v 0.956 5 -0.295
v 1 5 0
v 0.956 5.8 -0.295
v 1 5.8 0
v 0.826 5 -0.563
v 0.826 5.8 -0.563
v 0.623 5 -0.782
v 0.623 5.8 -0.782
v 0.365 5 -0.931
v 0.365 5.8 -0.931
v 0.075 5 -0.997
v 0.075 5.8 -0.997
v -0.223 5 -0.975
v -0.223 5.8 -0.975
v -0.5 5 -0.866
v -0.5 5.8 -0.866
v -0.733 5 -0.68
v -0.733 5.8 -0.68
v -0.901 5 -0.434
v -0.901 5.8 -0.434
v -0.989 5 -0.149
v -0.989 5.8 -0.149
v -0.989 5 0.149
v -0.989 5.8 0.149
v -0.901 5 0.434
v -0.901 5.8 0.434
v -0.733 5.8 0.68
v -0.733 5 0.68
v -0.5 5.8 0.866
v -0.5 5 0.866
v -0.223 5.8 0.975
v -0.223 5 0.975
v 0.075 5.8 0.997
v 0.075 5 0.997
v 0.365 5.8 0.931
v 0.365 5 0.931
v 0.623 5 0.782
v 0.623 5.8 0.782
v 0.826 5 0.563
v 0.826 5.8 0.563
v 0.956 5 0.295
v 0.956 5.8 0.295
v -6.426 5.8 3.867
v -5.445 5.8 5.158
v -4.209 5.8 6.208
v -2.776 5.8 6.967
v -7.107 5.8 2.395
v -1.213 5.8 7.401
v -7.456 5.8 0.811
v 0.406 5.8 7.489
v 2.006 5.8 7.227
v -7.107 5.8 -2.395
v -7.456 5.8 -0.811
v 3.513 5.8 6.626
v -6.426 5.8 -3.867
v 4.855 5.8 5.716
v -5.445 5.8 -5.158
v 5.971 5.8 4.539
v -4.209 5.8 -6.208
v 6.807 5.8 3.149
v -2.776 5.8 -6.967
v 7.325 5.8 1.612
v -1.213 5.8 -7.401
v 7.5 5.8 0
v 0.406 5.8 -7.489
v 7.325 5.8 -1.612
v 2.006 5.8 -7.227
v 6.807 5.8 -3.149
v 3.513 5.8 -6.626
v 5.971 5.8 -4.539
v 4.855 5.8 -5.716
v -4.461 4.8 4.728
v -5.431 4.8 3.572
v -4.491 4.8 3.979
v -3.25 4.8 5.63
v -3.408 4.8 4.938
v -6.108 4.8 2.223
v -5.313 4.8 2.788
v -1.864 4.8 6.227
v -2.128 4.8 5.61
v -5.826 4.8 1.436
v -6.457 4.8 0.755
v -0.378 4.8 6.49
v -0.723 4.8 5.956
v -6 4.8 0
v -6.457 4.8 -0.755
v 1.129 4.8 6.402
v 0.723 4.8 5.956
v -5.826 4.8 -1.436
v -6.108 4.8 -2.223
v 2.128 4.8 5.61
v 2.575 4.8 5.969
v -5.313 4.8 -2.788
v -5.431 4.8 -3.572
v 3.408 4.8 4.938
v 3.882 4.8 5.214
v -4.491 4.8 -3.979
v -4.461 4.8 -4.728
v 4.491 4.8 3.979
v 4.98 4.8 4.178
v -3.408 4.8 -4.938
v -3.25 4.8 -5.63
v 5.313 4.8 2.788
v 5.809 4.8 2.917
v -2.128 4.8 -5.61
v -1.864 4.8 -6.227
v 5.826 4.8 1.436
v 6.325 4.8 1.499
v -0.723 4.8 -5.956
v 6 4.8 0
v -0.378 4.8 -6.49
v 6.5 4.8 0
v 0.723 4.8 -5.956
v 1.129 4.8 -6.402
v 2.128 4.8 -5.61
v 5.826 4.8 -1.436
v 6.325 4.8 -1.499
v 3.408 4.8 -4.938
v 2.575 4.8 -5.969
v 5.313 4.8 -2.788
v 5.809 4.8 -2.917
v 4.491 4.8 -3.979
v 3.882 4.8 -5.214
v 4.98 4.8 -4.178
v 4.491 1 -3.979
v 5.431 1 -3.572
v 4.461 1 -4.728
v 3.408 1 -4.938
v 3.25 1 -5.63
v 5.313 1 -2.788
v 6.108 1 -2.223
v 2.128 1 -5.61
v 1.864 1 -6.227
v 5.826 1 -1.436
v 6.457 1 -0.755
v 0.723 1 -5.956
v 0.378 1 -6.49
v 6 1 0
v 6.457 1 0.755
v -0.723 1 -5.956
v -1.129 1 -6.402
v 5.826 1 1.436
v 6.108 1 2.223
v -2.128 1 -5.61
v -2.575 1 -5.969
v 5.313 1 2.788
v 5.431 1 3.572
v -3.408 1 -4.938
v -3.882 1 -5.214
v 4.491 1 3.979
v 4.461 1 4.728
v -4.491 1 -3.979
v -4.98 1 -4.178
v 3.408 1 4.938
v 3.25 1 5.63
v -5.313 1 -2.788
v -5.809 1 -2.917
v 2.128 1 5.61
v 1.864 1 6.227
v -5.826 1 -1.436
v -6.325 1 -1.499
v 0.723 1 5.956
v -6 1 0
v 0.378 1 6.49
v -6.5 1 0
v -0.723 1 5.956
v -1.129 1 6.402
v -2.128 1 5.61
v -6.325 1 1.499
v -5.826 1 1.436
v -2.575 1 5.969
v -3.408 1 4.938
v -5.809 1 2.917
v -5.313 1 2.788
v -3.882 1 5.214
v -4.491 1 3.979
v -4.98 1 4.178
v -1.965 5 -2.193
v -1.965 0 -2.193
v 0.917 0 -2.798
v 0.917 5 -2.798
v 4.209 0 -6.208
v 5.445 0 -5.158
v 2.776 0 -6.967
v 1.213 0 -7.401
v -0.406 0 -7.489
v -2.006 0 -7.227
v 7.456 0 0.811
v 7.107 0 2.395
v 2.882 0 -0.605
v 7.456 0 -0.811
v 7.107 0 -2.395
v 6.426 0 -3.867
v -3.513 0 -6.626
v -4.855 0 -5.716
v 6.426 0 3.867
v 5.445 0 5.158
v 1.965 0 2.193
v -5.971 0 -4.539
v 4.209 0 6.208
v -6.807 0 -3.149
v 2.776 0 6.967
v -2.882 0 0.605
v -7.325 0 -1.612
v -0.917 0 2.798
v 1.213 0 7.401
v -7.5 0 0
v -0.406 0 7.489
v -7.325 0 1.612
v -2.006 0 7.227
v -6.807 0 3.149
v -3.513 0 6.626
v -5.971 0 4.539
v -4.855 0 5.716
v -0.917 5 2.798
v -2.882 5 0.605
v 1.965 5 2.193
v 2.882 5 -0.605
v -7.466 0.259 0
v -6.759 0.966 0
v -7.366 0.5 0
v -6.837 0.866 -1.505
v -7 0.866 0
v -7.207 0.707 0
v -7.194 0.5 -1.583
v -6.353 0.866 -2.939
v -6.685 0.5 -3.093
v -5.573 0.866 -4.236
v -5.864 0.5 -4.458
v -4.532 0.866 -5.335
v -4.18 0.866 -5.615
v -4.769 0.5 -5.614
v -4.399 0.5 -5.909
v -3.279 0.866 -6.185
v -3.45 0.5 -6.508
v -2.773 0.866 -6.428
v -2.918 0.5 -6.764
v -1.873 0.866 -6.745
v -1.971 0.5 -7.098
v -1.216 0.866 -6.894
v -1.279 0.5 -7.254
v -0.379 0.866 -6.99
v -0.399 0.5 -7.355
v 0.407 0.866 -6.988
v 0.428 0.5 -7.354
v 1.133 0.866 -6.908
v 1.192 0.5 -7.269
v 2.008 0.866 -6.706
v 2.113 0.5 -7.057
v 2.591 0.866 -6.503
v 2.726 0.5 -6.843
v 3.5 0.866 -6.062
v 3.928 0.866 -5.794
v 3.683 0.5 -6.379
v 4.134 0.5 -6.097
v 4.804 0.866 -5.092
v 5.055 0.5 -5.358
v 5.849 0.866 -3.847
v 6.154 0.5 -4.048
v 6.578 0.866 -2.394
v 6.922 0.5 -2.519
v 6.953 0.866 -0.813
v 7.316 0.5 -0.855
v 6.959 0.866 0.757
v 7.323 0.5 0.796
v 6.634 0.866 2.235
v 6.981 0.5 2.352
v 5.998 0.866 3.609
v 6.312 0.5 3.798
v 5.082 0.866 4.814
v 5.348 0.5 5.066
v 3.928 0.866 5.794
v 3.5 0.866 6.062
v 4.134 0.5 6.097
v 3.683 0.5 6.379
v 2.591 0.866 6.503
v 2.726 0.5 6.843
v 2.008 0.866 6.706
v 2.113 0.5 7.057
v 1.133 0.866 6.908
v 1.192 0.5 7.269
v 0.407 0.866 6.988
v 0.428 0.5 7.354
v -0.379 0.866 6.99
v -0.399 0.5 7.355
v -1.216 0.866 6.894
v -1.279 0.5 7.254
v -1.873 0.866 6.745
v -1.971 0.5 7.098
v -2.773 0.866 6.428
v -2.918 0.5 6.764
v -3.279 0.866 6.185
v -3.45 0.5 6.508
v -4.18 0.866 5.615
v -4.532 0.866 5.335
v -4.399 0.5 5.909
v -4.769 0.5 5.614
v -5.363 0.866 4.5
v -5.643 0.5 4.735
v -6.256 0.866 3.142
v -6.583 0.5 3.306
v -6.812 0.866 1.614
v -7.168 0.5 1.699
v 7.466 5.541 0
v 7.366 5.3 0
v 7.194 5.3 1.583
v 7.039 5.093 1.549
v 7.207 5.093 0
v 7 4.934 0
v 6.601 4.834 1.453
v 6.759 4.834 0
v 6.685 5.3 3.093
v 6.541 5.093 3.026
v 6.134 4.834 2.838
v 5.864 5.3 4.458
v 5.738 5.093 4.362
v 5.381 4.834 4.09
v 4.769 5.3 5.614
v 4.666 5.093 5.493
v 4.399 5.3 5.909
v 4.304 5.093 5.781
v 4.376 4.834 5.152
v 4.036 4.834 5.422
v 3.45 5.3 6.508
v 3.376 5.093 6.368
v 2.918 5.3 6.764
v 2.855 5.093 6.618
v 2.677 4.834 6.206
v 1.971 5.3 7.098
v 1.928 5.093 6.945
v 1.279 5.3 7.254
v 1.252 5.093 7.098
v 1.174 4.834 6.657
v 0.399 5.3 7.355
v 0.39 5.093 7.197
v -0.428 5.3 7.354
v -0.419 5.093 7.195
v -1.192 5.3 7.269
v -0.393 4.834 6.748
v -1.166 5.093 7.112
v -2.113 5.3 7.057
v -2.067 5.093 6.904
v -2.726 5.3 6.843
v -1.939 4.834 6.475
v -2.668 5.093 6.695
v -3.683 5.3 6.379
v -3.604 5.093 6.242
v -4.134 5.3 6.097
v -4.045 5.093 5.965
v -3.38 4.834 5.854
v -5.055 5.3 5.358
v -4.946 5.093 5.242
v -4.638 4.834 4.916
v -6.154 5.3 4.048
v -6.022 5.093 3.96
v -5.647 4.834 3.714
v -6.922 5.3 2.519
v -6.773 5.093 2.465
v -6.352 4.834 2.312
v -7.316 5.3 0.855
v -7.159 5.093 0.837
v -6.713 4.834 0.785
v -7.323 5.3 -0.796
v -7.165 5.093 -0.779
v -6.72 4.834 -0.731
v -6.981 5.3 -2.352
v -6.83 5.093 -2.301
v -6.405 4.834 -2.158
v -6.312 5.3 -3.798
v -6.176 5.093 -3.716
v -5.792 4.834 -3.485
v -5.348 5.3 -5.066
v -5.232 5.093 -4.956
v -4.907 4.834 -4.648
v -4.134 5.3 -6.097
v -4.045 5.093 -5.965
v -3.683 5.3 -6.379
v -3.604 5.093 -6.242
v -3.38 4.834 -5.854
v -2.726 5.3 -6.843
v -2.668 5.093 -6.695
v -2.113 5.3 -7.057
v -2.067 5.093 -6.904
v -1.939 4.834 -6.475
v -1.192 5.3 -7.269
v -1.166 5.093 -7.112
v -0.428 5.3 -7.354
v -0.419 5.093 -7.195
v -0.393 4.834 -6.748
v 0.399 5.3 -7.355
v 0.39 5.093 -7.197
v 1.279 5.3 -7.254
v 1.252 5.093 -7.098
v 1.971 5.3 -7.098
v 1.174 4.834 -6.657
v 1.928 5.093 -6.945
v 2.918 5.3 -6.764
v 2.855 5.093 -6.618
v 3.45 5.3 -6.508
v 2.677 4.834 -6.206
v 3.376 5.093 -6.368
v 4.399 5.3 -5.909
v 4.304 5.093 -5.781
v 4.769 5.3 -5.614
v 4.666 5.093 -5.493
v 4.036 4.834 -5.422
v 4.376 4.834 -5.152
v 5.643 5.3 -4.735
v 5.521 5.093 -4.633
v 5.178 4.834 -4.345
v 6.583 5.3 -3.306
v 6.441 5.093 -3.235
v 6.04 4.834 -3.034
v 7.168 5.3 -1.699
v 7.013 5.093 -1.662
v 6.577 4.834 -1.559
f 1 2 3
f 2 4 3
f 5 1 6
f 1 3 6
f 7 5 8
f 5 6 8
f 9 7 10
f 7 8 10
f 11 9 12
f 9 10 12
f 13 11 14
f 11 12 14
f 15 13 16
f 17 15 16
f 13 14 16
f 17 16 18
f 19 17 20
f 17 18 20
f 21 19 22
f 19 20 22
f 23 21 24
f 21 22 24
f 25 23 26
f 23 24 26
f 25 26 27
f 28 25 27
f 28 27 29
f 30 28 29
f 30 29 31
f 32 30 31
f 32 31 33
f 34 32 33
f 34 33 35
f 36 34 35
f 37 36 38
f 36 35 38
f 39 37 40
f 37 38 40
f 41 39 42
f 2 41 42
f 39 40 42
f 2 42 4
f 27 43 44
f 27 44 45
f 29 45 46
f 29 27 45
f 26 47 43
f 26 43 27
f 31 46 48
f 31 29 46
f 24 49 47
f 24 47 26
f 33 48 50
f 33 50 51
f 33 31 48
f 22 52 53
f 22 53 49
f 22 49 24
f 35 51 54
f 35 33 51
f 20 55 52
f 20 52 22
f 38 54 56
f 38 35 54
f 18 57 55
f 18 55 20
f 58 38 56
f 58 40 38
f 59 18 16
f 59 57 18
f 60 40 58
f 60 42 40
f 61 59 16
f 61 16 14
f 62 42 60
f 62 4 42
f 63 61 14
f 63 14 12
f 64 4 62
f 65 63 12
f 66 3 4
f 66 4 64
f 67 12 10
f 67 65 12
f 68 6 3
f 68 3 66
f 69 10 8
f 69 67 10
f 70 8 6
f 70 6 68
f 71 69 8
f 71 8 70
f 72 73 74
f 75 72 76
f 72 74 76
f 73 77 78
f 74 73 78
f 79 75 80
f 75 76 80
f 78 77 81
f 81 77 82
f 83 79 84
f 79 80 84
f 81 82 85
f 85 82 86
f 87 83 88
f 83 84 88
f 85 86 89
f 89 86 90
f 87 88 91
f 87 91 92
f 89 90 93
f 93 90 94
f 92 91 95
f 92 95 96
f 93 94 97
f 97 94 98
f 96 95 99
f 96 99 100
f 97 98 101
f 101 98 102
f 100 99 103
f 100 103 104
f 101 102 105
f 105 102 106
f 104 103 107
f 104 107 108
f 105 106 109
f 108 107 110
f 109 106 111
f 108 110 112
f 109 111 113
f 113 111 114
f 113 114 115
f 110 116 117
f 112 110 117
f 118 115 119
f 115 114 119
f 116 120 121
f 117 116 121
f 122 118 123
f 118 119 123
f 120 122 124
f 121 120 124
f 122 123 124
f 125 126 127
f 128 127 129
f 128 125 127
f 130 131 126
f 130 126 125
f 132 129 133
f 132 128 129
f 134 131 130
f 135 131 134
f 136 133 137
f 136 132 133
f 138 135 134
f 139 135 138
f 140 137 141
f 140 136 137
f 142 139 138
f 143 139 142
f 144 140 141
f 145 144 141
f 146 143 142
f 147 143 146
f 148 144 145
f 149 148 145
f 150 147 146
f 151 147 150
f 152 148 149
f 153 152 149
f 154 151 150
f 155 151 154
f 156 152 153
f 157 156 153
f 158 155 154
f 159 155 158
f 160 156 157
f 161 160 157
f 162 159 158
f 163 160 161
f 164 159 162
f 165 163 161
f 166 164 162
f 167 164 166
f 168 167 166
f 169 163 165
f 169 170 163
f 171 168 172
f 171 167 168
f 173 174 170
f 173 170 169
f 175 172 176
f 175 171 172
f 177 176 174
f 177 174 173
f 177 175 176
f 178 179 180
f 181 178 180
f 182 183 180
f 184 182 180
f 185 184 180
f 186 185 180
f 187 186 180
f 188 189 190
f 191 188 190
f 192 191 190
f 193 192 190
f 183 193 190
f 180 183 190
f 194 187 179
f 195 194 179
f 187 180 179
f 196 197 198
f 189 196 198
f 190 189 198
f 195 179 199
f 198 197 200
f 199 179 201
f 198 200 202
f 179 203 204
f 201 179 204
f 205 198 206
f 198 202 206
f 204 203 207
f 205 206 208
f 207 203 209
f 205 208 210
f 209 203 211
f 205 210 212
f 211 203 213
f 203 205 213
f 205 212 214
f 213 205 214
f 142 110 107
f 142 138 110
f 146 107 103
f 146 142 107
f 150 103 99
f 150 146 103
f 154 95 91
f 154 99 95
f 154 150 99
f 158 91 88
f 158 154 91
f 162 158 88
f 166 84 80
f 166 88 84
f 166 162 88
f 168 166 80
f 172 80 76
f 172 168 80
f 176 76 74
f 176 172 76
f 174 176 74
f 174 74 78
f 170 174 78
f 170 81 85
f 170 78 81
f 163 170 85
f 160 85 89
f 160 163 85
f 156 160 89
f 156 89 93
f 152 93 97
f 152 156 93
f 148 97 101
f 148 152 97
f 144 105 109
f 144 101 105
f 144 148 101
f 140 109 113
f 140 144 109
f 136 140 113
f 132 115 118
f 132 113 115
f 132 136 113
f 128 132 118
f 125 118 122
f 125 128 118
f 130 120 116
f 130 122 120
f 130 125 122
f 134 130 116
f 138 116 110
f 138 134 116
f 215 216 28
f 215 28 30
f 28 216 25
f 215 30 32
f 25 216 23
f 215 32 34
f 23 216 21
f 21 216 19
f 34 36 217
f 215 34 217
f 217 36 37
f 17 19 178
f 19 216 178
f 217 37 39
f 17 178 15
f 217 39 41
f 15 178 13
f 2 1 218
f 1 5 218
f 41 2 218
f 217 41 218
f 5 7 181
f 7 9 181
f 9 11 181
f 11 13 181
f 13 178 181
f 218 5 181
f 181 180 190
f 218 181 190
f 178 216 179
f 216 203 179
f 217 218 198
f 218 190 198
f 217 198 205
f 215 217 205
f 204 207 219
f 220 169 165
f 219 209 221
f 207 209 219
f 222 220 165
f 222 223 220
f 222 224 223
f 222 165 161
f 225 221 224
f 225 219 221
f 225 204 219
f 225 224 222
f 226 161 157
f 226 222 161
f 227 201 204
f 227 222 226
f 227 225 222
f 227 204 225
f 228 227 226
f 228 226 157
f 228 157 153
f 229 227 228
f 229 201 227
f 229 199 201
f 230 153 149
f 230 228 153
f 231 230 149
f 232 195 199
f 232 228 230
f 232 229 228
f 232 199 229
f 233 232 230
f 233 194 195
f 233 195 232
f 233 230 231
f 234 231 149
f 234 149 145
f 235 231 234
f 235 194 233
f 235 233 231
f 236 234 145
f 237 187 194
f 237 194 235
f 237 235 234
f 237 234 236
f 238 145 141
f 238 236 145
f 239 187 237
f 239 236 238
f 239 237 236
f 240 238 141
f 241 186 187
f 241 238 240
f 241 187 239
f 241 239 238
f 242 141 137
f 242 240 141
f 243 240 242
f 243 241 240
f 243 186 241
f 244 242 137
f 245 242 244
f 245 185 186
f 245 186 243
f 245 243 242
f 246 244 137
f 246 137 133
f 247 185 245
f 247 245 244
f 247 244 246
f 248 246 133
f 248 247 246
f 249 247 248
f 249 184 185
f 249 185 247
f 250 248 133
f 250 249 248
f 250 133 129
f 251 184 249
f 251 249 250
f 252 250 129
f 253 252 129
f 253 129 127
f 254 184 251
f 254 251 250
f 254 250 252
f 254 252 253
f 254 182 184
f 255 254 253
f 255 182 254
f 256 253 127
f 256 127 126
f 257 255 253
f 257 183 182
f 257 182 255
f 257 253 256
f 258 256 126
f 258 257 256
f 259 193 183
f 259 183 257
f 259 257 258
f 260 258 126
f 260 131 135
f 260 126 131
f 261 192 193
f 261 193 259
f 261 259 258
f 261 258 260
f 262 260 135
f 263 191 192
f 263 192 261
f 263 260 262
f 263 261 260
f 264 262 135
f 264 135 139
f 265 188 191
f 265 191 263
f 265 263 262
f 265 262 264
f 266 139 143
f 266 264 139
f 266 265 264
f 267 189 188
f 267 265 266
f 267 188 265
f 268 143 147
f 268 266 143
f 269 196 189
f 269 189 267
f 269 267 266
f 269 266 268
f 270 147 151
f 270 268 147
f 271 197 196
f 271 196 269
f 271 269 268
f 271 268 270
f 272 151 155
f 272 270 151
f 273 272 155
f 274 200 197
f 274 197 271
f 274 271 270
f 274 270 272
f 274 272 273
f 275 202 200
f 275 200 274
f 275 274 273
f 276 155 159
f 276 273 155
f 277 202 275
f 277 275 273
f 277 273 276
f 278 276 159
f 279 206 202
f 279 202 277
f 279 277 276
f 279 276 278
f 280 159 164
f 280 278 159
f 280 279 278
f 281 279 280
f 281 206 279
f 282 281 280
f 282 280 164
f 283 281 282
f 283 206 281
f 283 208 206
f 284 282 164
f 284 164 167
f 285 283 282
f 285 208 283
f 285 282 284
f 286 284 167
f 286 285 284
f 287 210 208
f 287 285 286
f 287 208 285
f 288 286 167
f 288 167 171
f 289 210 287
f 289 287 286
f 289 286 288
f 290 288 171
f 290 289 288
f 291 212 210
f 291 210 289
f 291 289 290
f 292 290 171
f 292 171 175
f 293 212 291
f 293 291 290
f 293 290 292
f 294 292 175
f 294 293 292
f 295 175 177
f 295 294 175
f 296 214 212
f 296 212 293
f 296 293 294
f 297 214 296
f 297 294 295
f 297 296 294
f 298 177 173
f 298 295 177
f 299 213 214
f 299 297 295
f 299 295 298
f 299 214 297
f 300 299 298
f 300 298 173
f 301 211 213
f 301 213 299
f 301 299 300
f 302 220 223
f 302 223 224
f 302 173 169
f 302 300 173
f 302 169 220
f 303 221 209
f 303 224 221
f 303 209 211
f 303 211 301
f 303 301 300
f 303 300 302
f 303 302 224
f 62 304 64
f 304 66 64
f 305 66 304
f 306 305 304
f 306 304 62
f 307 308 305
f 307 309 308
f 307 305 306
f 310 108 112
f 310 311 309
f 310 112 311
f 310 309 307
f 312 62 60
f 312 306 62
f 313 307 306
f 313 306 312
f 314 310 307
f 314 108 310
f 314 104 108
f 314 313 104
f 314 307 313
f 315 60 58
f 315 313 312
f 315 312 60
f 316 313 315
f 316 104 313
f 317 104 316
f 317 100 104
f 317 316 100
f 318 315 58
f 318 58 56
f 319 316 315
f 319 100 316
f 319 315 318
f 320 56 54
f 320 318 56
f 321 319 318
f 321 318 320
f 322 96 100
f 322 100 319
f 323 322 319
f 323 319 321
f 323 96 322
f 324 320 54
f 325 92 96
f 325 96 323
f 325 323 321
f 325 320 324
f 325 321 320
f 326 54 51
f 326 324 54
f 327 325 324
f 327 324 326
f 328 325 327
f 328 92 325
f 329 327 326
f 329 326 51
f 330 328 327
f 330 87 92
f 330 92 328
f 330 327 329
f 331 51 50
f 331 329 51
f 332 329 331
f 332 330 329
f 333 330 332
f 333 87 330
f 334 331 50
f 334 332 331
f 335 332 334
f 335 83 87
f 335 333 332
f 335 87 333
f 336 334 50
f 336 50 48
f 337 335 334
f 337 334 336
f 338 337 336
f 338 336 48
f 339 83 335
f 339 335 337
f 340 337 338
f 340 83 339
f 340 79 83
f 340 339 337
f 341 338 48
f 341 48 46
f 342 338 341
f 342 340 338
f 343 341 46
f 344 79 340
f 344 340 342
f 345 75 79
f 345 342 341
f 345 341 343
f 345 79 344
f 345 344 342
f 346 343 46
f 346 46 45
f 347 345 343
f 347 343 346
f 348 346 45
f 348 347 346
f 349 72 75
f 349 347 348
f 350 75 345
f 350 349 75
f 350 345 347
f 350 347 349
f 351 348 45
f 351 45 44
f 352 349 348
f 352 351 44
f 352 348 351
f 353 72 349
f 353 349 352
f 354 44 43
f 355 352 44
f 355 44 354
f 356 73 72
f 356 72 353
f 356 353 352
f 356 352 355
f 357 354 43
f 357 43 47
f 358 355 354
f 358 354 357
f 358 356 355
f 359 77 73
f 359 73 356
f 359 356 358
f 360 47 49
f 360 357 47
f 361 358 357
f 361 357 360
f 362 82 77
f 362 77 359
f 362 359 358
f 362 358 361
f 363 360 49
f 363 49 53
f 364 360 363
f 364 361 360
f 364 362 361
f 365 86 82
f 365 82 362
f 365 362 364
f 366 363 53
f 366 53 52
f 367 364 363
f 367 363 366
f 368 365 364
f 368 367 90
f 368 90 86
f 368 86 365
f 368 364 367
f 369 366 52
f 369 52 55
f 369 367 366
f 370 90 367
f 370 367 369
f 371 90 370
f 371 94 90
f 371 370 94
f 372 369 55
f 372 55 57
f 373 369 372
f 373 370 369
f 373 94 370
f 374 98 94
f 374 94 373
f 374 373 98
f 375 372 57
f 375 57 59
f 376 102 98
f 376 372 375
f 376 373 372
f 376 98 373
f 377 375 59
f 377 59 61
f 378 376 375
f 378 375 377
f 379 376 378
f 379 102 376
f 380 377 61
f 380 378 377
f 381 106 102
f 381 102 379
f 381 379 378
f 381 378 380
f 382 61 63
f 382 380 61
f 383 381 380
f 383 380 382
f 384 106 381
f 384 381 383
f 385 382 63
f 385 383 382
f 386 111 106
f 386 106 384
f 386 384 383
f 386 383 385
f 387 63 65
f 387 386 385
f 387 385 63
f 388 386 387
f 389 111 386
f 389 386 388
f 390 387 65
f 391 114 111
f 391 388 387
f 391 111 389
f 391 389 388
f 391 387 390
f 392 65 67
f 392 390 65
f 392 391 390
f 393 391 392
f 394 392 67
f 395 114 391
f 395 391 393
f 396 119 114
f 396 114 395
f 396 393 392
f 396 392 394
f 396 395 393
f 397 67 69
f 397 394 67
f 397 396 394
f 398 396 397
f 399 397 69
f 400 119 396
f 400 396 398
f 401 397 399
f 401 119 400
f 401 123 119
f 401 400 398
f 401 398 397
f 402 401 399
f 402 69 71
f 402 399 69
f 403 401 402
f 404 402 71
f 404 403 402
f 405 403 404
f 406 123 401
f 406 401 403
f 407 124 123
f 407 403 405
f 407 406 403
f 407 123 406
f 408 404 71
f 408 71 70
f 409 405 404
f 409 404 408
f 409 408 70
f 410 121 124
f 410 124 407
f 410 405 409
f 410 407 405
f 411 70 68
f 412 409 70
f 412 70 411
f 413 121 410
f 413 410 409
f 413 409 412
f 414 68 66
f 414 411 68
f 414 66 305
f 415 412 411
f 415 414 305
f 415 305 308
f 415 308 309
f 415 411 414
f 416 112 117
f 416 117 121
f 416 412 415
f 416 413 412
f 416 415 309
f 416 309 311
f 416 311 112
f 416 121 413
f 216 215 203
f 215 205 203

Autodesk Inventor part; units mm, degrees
ref_plane "YZ Plane" through (0, 0, 0) normal (1, 0, 0) x (0, 1, 0)
ref_plane "XZ Plane" through (0, 0, 0) normal (0, 1, 0) x (-1, 0, 0)
ref_plane "XY Plane" through (0, 0, 0) normal (0, 0, 1) x (1, 0, 0)
sketch "스케치1" plane through (0, 0, 0) normal (0, 1, 0) x (-1, 0, 0)
  line L0 (-0.9169, -2.7981) -> (-2.8817, -0.6049)
  line L1 (-2.8817, -0.6049) -> (-1.9647, 2.1931)
  line L2 (-1.9647, 2.1931) -> (0.9169, 2.7981)
  line L3 (0.9169, 2.7981) -> (2.8817, 0.6049)
  line L4 (2.8817, 0.6049) -> (1.9647, -2.1931)
  line L5 (1.9647, -2.1931) -> (-0.9169, -2.7981)
  circle A0 centre (0, 0) radius 7.5
  dimension "d0" = 5.1
  dimension "d1" = 15
extrude "돌출1" add sketch "스케치1" along normal blind 1
sketch "스케치2" plane through (0, 1, 0) normal (0, 1, 0) x (1, 0, 0)
  circle A0 centre (0, 0) radius 6
  line L0 (2.8817, 0.6049) -> (1.9647, -2.1931) projected
  line L1 (1.9647, -2.1931) -> (-0.9169, -2.7981) projected
  line L2 (-0.9169, -2.7981) -> (-2.8817, -0.6049) projected
  line L3 (-2.8817, -0.6049) -> (-1.9647, 2.1931) projected
  line L4 (-1.9647, 2.1931) -> (0.9169, 2.7981) projected
  line L5 (0.9169, 2.7981) -> (2.8817, 0.6049) projected
  circle A1 centre (0, 0) radius 7.5 projected
  dimension "d4" = 12
extrude "돌출2" add sketch "스케치2" along normal blind 3.8 contours A0
sketch "스케치3" plane through (0, 4.8, 0) normal (0, 1, 0) x (1, 0, 0)
  circle A0 centre (0, 0) radius 7.5
  circle A1 centre (0, 0) radius 7.5 projected
  line L0 (1.9647, -2.1931) -> (-0.9169, -2.7981) projected
  line L1 (-0.9169, -2.7981) -> (-2.8817, -0.6049) projected
  line L2 (-2.8817, -0.6049) -> (-1.9647, 2.1931) projected
  line L3 (-1.9647, 2.1931) -> (0.9169, 2.7981) projected
  line L4 (0.9169, 2.7981) -> (2.8817, 0.6049) projected
  line L5 (2.8817, 0.6049) -> (1.9647, -2.1931) projected
  circle A2 centre (0, 0) radius 6 projected
  dimension "d7" = 15
extrude "돌출3" add sketch "스케치3" along normal blind 1 contours A0 | A2
sketch "스케치4" plane through (0, 5.8, 0) normal (0, 1, 0) x (1, 0, 0)
  point P0 (0, 0)
sketch "스케치5" plane through (0, 5.8, 0) normal (0, 1, 0) x (1, 0, 0)
  circle A0 centre (0, 0) radius 5
  circle A1 centre (0, 0) radius 1
  dimension "d10" = 10
  dimension "d11" = 2
extrude "돌출4" add sketch "스케치5" against normal blind 0.8
fillet "모깎기1" radius 1 2 edges at (7.5, 1, 0) (-7.5, 4.8, 0)
sketch "스케치6" plane through (0.9169, 0, -2.7981) normal (-0.7448, 0, 0.6673) x (0.6673, 0, 0.7448)
  point P0 (1.4722, 0)
sketch "스케치7" plane through (-2.8817, 0, 0.6049) normal (0.9503, 0, 0.3114) x (0.3114, 0, -0.9503)
  point P0 (1.4722, 0)
properties part number "motor gear"
